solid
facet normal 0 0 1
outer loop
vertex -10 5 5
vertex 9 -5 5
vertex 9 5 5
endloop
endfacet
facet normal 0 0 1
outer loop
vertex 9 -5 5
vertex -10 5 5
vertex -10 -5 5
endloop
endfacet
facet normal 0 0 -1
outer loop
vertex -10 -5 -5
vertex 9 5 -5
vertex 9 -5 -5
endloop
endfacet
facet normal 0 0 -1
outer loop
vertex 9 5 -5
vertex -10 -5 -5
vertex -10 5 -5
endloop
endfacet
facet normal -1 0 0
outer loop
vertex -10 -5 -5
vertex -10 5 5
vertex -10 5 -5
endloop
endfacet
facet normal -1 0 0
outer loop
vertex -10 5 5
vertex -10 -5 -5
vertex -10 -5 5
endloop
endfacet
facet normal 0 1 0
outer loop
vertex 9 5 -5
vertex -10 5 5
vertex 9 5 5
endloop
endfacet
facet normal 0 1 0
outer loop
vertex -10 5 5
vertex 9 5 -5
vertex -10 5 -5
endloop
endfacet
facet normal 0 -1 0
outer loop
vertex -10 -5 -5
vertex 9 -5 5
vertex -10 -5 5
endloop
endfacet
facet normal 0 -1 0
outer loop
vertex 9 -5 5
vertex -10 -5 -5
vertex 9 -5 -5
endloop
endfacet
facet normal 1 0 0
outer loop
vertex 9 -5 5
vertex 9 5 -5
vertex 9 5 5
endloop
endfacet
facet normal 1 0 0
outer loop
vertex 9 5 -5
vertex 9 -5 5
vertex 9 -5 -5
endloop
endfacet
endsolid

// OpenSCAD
difference(){




cube([20,10,10],center = true);

translate ([10,0,0]) cube([2,20,20],center = true);
}
